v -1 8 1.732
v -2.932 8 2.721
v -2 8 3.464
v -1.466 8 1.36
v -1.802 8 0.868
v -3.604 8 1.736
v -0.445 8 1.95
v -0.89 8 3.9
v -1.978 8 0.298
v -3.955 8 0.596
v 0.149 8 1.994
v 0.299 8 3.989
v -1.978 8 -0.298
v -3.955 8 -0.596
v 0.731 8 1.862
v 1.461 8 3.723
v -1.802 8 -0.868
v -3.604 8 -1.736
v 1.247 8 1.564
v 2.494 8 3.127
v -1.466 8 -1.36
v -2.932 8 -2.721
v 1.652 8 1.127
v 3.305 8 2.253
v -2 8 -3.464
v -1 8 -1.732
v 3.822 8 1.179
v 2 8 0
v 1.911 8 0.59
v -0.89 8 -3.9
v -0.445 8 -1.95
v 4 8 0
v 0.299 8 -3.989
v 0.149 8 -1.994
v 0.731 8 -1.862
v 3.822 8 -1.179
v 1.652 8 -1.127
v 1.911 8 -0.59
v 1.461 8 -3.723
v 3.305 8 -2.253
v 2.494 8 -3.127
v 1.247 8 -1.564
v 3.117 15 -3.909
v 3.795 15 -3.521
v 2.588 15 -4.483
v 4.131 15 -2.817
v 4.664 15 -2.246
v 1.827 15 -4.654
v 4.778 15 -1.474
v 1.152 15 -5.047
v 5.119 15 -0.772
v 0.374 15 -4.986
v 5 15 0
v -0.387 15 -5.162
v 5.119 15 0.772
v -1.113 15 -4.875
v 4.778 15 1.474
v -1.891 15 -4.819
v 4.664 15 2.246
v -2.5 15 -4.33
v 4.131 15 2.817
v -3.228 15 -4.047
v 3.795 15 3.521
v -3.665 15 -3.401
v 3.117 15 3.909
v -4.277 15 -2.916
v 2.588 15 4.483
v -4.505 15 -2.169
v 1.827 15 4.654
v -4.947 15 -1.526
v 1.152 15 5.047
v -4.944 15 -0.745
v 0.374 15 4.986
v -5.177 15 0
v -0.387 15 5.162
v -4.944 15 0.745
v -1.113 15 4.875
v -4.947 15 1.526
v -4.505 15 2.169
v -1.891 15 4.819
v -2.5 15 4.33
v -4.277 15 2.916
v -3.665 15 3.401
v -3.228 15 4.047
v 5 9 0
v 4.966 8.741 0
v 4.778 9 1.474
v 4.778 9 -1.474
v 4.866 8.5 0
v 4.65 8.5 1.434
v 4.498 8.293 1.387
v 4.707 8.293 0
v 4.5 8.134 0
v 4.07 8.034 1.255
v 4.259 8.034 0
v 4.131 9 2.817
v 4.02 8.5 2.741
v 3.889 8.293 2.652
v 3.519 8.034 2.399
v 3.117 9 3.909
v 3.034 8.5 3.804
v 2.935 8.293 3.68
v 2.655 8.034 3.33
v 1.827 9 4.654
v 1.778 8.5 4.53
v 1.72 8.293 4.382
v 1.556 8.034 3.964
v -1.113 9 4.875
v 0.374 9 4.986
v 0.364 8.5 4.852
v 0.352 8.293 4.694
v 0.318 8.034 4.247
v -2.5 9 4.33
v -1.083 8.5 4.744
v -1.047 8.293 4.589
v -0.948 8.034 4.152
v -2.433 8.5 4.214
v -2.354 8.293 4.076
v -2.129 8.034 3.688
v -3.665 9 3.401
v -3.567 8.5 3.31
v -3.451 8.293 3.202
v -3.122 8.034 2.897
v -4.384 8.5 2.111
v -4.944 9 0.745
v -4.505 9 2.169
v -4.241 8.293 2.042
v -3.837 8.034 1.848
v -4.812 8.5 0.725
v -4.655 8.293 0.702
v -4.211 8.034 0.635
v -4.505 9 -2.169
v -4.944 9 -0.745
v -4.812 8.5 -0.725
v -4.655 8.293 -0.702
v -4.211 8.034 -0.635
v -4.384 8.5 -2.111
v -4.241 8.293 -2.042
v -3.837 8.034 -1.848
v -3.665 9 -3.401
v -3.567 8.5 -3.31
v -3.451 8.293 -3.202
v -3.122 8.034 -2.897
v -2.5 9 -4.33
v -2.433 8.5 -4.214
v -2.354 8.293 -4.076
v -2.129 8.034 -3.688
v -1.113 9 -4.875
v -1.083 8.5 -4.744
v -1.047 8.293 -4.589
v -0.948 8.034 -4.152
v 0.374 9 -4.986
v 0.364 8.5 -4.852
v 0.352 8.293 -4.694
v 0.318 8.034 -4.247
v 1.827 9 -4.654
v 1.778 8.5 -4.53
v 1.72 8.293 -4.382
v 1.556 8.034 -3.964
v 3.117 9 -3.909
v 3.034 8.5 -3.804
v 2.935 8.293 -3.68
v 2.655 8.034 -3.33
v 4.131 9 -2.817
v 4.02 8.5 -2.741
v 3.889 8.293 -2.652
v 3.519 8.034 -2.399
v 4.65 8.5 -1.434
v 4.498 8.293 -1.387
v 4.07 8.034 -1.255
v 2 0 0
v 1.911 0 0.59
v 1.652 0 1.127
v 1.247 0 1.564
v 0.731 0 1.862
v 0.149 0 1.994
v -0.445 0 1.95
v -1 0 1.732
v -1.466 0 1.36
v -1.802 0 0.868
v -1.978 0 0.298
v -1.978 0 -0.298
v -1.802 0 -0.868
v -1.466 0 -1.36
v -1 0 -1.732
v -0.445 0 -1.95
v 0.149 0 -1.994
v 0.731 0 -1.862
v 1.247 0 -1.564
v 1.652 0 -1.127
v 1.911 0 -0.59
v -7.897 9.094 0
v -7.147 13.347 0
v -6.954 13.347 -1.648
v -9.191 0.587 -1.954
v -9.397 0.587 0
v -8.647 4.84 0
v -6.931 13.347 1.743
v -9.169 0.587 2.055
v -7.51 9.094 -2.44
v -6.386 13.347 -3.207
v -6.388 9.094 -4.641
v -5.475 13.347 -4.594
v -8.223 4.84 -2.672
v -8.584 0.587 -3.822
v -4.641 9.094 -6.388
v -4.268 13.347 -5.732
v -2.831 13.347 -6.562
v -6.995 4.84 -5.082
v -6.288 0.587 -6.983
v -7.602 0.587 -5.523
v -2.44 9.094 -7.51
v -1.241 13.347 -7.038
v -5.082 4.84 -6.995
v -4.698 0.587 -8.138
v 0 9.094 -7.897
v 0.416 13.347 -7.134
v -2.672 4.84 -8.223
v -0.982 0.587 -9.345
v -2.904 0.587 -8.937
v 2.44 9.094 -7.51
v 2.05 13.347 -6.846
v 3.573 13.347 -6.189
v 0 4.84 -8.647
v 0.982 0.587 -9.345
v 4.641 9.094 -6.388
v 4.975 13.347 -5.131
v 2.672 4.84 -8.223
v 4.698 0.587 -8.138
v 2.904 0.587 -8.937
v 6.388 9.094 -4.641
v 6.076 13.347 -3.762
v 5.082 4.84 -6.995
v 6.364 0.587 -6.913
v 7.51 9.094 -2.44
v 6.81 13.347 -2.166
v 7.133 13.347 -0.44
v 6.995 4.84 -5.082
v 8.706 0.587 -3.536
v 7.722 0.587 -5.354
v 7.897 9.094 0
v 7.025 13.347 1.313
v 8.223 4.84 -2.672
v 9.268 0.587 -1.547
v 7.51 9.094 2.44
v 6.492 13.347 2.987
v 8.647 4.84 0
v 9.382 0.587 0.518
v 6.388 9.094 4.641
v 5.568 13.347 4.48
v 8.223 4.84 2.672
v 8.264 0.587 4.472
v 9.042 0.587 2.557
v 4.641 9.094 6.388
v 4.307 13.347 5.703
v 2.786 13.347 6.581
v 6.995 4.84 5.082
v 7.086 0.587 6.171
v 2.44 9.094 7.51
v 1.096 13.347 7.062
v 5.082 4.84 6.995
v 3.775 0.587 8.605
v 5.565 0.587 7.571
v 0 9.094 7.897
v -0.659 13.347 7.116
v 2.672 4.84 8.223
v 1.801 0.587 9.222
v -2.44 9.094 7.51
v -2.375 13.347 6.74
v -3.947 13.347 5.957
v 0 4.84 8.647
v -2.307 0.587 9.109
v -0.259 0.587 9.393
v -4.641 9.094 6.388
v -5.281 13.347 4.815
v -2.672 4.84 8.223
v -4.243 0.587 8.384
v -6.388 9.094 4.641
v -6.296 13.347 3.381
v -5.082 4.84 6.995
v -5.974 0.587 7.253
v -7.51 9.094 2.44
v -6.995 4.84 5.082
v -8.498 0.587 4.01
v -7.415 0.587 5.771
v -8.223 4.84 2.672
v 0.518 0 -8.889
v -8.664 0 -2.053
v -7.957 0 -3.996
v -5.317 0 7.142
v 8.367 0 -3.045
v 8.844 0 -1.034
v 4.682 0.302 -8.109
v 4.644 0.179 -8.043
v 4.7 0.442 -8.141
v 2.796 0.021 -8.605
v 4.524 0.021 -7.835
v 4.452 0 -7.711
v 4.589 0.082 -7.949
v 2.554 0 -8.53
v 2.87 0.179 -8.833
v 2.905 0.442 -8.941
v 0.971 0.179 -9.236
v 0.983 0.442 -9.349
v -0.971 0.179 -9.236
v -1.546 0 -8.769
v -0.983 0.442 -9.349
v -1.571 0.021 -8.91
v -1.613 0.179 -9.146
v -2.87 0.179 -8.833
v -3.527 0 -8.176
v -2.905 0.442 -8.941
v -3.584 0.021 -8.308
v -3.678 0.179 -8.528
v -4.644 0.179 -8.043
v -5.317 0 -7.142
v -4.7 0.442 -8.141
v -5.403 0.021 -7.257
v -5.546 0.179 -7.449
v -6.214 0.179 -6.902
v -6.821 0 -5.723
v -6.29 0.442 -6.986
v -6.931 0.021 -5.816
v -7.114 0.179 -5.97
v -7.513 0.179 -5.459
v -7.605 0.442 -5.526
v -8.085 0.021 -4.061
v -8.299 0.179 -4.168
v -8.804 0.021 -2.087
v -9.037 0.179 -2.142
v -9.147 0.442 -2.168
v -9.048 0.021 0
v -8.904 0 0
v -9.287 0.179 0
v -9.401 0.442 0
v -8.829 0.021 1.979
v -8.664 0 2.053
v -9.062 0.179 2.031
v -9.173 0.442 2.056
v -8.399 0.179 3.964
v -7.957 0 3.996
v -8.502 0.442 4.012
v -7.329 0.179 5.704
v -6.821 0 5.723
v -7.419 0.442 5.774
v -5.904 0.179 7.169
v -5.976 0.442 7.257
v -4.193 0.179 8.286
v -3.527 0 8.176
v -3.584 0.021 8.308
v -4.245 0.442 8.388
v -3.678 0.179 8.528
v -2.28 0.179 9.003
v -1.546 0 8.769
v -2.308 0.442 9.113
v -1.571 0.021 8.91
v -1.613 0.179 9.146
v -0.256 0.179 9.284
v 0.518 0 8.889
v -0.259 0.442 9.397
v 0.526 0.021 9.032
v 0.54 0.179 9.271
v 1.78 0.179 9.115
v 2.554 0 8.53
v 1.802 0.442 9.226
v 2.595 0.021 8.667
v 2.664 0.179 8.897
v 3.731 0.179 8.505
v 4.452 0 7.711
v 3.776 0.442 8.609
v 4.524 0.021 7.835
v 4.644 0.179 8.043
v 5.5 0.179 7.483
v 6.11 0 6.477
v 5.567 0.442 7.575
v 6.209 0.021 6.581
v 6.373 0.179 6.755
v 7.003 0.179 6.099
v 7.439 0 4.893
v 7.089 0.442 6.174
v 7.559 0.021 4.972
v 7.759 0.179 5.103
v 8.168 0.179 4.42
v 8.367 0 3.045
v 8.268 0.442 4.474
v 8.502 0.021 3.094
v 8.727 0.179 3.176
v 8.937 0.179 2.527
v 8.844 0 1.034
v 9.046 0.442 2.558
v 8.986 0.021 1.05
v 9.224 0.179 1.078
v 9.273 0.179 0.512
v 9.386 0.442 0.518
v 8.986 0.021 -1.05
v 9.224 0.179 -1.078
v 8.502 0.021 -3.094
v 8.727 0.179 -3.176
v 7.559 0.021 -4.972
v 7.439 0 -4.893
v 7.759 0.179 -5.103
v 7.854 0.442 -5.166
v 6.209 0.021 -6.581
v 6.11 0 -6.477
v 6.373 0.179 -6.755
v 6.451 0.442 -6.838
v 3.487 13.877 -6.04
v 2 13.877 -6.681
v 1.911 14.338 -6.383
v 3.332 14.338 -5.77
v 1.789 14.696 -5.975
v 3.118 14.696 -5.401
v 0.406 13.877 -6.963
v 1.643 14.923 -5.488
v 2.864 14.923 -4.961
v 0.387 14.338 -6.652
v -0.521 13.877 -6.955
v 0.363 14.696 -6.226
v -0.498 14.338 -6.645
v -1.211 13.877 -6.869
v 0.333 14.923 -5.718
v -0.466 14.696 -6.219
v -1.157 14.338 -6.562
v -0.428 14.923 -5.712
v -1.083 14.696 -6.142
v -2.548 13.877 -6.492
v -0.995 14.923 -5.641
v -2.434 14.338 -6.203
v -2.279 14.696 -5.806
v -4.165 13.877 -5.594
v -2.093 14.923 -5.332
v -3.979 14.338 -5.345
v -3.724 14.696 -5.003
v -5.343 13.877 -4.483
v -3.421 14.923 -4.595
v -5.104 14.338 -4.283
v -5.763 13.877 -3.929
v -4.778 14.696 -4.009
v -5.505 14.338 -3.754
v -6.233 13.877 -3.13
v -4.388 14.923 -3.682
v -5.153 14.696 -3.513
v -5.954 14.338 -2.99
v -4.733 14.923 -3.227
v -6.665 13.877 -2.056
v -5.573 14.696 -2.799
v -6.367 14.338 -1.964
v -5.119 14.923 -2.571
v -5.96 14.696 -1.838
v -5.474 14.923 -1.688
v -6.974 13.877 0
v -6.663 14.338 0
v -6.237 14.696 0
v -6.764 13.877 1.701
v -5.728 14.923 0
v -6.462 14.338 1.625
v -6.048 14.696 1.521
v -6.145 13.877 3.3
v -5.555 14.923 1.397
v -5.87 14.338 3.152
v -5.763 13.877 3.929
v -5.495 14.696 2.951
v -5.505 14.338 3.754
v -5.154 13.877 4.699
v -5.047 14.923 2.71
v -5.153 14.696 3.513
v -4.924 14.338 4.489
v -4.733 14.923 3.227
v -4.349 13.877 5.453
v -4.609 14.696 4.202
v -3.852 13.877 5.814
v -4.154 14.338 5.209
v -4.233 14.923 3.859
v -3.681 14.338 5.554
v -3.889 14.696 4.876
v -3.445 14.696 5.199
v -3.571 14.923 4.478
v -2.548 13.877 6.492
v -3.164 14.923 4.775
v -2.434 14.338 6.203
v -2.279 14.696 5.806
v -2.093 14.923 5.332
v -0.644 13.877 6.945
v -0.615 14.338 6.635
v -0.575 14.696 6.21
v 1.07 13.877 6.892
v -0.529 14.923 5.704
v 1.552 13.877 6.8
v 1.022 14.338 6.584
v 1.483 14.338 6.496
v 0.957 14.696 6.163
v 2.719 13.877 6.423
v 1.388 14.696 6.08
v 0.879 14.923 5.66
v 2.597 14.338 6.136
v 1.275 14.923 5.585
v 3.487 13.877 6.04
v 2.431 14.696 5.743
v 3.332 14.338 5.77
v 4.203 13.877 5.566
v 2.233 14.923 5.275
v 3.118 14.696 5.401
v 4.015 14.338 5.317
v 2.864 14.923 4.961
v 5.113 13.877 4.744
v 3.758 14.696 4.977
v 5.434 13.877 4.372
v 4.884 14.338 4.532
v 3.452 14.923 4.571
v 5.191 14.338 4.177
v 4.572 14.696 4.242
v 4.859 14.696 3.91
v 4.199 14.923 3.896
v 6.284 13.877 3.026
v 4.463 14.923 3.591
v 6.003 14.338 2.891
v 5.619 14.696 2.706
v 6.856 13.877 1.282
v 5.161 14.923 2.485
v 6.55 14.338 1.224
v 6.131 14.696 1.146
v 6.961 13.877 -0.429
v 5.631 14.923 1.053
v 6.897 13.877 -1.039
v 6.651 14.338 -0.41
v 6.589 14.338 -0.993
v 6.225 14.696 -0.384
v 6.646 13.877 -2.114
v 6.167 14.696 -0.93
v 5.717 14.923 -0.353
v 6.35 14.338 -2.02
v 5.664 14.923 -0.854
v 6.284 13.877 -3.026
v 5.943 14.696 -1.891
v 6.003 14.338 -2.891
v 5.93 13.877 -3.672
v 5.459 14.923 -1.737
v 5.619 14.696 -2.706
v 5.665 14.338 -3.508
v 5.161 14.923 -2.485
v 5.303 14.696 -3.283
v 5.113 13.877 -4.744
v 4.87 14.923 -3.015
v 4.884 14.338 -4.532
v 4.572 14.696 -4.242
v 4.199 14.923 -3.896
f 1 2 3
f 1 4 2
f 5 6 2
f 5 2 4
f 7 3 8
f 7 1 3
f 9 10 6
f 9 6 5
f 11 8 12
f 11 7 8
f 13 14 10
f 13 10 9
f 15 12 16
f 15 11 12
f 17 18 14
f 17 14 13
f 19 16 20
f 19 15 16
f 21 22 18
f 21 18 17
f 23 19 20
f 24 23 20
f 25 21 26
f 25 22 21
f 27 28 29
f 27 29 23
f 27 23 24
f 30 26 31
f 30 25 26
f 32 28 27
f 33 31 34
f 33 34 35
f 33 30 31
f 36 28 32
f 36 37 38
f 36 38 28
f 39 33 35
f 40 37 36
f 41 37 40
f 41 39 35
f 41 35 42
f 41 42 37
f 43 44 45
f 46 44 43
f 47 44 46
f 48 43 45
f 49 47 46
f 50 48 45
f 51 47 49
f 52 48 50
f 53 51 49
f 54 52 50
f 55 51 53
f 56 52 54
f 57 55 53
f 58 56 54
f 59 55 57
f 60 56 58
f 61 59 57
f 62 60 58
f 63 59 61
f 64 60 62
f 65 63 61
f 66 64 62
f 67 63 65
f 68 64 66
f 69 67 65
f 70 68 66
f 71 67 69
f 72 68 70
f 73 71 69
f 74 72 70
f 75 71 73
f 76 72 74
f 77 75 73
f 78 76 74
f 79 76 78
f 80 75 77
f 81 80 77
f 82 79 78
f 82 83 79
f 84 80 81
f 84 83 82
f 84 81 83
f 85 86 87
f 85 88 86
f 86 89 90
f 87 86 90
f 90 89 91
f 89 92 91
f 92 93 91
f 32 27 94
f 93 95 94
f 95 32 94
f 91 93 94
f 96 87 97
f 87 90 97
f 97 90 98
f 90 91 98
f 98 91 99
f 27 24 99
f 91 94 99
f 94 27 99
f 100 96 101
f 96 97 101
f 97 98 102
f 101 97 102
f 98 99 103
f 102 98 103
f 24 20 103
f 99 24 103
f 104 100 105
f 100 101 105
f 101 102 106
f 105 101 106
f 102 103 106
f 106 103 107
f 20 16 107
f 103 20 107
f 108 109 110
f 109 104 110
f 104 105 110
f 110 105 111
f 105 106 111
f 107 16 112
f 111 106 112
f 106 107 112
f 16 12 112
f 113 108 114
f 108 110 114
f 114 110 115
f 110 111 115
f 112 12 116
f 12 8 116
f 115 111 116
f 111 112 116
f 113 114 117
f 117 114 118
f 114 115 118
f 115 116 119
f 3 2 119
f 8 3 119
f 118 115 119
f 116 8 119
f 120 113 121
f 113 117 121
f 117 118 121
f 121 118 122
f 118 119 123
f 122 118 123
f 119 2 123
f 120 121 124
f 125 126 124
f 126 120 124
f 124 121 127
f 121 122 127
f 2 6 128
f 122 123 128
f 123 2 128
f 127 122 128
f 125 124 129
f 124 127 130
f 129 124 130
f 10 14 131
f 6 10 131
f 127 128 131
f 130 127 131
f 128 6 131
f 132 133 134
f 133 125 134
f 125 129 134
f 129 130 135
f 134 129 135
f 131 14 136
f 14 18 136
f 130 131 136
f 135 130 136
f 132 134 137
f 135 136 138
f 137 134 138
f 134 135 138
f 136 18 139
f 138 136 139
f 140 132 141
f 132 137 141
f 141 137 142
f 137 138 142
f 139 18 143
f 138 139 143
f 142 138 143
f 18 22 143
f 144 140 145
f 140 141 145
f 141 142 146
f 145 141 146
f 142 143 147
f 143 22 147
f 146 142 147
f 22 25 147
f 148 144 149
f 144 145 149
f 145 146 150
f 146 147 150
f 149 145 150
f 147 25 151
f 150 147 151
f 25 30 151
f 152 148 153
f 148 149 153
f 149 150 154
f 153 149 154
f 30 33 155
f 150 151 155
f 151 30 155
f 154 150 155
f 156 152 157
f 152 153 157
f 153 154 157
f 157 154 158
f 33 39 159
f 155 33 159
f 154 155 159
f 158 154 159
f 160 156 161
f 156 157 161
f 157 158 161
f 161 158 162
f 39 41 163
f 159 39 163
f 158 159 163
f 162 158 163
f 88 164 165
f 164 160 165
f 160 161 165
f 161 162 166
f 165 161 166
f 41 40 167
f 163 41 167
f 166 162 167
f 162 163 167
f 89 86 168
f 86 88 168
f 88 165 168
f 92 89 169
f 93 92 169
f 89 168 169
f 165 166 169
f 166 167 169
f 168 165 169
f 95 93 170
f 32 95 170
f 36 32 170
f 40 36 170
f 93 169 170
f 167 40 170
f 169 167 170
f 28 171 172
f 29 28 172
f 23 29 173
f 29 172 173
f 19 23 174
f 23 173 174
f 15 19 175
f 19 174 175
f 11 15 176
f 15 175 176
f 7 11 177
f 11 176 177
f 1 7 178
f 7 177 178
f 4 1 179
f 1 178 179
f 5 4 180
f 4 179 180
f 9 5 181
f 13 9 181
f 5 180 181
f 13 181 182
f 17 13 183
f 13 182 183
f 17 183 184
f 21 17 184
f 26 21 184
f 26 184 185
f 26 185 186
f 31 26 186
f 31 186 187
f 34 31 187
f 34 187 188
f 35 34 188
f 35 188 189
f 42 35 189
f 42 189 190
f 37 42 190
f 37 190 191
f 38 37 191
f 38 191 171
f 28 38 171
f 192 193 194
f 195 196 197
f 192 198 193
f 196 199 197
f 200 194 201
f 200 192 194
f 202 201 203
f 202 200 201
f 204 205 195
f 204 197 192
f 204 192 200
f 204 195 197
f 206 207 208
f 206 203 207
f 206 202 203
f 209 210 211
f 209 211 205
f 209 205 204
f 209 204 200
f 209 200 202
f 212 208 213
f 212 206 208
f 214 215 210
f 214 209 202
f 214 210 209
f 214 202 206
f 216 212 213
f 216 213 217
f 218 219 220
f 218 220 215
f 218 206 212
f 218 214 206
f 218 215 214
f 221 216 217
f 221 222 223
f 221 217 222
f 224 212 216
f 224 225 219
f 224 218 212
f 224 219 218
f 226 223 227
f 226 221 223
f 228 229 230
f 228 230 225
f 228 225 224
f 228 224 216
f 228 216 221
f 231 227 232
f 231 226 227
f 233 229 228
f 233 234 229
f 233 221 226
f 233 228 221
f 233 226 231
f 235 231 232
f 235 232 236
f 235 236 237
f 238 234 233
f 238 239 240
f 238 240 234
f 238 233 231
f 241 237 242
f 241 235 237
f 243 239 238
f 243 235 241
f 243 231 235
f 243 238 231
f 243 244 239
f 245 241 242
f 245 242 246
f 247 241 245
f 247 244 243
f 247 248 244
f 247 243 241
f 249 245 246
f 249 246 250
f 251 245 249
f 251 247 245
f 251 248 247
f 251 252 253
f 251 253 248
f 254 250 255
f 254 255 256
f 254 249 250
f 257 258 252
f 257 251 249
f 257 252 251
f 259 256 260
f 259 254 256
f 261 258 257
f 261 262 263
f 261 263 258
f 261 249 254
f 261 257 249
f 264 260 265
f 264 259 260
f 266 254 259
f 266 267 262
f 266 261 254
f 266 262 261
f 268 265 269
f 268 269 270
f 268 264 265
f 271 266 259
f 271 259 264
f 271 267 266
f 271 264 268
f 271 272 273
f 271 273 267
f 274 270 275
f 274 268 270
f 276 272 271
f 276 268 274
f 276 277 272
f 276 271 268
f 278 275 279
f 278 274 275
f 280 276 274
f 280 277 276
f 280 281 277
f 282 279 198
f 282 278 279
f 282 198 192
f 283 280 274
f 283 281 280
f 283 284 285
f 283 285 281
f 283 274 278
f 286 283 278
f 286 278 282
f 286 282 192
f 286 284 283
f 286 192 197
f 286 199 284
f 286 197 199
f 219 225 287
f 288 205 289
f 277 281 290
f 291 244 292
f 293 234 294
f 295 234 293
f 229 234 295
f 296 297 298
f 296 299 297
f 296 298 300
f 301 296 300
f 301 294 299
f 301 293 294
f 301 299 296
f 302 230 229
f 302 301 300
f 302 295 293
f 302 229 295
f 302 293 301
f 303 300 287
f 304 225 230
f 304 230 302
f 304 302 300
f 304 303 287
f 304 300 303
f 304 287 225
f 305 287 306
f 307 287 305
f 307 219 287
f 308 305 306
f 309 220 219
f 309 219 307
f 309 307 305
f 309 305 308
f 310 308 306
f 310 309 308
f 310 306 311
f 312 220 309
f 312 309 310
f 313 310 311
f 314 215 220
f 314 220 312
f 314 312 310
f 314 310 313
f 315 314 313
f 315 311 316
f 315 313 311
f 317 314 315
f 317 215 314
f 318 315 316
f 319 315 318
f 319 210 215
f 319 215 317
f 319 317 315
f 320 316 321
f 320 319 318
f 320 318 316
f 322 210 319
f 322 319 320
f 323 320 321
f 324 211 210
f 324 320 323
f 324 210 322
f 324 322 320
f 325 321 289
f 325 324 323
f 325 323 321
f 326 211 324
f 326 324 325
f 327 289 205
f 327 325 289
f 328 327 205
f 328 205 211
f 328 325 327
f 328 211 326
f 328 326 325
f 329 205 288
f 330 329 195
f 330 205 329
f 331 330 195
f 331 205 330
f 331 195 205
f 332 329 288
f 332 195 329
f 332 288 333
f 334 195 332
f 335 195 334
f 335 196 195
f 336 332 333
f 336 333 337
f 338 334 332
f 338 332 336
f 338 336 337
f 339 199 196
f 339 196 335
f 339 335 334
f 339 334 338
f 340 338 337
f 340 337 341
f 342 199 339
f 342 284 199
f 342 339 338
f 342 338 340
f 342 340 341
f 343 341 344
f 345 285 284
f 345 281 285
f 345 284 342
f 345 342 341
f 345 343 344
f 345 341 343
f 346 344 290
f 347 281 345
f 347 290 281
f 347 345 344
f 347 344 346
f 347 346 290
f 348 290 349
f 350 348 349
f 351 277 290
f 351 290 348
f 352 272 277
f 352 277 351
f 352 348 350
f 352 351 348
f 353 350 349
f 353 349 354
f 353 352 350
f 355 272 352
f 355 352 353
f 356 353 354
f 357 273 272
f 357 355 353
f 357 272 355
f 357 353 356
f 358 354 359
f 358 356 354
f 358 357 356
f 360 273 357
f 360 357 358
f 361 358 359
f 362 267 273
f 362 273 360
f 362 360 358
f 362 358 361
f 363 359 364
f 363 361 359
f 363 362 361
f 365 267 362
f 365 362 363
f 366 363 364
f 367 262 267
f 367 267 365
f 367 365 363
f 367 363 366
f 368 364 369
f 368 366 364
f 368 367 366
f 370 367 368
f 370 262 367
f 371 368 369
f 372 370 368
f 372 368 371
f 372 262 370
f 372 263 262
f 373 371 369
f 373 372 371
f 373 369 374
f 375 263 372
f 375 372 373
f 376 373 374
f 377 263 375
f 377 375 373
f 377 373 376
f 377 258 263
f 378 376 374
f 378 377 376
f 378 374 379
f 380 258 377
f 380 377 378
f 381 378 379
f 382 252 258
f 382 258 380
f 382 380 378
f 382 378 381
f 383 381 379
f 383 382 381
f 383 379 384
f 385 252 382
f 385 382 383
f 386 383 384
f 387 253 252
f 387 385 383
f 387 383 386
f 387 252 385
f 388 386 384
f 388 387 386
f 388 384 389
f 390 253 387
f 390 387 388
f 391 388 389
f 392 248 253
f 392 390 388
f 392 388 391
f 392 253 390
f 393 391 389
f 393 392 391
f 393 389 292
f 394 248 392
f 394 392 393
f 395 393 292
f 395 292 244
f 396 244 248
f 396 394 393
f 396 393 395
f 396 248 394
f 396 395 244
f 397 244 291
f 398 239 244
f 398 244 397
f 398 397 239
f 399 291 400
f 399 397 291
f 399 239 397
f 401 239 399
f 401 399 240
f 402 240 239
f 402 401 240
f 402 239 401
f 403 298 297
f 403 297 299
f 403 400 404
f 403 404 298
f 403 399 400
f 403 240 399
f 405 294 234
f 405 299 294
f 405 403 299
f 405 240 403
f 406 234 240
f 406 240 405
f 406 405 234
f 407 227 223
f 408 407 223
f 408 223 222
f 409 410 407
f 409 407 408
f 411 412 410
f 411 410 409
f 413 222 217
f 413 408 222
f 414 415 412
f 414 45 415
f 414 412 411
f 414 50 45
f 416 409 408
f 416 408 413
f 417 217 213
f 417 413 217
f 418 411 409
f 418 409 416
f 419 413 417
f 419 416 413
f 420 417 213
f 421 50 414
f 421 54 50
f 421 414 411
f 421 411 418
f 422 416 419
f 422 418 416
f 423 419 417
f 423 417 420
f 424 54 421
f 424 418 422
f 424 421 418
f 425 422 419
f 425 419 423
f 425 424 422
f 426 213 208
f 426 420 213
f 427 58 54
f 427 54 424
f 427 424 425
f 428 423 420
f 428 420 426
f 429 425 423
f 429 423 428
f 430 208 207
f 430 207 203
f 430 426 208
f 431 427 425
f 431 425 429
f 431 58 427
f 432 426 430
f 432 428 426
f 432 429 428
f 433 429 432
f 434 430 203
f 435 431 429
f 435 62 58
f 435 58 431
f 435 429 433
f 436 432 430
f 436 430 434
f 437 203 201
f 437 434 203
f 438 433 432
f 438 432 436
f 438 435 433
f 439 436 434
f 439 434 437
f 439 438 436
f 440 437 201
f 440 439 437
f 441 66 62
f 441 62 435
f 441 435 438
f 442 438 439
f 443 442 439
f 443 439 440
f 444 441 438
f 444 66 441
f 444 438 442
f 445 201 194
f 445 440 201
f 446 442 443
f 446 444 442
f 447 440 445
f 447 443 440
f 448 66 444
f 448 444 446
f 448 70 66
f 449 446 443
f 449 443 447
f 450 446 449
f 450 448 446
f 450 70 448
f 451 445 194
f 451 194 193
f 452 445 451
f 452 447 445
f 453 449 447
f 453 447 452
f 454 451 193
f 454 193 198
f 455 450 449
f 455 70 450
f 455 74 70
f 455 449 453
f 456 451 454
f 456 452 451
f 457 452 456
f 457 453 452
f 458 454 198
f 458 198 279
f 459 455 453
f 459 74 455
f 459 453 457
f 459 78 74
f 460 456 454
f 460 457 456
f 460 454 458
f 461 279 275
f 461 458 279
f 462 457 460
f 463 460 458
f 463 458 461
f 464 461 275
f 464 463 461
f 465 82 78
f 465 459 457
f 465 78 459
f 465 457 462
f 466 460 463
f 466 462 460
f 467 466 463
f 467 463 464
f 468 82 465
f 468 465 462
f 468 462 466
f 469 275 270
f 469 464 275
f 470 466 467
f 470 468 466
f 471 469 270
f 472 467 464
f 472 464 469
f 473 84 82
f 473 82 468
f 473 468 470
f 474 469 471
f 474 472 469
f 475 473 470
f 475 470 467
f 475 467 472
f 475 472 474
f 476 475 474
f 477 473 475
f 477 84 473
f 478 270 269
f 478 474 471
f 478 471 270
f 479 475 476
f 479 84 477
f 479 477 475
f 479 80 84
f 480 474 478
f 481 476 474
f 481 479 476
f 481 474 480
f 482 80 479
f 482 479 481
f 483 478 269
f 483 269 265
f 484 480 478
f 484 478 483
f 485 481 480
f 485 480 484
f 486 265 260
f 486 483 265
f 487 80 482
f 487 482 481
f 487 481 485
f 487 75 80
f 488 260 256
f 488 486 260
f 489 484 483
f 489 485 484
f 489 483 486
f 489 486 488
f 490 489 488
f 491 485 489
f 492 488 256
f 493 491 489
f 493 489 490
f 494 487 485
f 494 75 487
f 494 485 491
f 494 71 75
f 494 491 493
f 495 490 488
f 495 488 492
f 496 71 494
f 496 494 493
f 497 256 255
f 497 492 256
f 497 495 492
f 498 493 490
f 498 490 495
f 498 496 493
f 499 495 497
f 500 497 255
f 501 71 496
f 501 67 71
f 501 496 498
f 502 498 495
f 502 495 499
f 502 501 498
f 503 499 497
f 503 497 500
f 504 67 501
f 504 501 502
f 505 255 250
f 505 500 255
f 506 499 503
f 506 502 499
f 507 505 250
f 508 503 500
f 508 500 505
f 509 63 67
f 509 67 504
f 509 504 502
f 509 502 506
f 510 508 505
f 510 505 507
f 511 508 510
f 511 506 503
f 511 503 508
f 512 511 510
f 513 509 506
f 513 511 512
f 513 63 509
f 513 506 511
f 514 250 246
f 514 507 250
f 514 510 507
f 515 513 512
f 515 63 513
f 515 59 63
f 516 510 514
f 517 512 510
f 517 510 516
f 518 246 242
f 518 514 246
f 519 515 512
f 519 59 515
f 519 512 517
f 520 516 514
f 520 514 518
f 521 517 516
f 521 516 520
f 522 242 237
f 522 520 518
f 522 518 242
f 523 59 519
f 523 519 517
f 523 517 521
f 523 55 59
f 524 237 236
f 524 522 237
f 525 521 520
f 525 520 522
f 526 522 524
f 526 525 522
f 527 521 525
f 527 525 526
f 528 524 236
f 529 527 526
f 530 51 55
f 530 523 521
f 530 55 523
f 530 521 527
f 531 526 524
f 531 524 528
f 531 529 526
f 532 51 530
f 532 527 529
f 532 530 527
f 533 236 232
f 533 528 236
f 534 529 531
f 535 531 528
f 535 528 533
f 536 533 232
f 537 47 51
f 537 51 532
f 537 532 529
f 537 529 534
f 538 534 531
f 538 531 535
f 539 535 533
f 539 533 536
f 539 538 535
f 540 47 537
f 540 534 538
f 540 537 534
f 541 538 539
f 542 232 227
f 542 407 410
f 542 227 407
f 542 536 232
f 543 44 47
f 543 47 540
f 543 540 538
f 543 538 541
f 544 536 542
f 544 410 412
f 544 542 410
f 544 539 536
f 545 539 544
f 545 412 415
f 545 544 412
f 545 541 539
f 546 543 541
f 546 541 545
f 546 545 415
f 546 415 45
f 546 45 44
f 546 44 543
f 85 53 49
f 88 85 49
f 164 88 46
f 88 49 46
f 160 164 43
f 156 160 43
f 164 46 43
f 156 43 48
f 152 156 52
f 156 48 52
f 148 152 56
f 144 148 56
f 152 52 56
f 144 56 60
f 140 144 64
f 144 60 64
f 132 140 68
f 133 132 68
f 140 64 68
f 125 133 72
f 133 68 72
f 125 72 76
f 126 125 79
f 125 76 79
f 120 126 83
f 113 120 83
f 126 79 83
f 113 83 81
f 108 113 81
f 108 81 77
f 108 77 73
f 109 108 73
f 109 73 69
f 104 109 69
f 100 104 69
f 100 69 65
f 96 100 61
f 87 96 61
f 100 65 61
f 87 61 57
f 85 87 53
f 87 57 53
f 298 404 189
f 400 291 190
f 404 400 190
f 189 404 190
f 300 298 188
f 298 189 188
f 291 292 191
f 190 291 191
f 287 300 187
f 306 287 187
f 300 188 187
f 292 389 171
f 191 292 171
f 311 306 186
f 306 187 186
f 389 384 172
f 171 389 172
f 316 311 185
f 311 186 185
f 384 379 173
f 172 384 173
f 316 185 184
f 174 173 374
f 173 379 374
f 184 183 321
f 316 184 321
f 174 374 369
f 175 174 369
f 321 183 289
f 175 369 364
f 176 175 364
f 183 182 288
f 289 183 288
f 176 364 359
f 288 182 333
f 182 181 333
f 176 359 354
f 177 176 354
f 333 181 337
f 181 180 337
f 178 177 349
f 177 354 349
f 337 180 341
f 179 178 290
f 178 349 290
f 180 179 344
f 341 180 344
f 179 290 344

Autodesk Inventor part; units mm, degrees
ref_plane "YZ Plane" through (0, 0, 0) normal (1, 0, 0) x (0, 1, 0)
ref_plane "XZ Plane" through (0, 0, 0) normal (0, 1, 0) x (-1, 0, 0)
ref_plane "XY Plane" through (0, 0, 0) normal (0, 0, 1) x (1, 0, 0)
sketch "Sketch1" plane through (0, 0, 0) normal (0, 1, 0) x (-1, 0, 0)
  circle A0 centre (0, 0) radius 9.5
  dimension "d0" = 19
extrude "Extrusion1" add sketch "Sketch1" along normal blind 15 draft -10
fillet "Fillet1" radius 2 1 edges at (6.8551, 15, 0)
fillet "Fillet2" radius 0.5 1 edges at (9.5, 0, 0)
sketch "Sketch2" plane through (0, 0, 0) normal (0, -1, 0) x (1, 0, 0)
  circle A0 centre (0, 0) radius 2
  dimension "d5" = 4
extrude "Extrusion2" cut sketch "Sketch2" against normal blind 15
sketch "Sketch3" plane through (0, 15, 0) normal (0, 1, 0) x (1, 0, 0)
  circle A0 centre (0, 0) radius 5
  dimension "d8" = 10
extrude "Extrusion3" cut sketch "Sketch3" against normal blind 7
fillet "Fillet3" radius 1 1 edges at (-5, 8, 0)
properties part number "Patas_para_licuadora" material "Rubber"
